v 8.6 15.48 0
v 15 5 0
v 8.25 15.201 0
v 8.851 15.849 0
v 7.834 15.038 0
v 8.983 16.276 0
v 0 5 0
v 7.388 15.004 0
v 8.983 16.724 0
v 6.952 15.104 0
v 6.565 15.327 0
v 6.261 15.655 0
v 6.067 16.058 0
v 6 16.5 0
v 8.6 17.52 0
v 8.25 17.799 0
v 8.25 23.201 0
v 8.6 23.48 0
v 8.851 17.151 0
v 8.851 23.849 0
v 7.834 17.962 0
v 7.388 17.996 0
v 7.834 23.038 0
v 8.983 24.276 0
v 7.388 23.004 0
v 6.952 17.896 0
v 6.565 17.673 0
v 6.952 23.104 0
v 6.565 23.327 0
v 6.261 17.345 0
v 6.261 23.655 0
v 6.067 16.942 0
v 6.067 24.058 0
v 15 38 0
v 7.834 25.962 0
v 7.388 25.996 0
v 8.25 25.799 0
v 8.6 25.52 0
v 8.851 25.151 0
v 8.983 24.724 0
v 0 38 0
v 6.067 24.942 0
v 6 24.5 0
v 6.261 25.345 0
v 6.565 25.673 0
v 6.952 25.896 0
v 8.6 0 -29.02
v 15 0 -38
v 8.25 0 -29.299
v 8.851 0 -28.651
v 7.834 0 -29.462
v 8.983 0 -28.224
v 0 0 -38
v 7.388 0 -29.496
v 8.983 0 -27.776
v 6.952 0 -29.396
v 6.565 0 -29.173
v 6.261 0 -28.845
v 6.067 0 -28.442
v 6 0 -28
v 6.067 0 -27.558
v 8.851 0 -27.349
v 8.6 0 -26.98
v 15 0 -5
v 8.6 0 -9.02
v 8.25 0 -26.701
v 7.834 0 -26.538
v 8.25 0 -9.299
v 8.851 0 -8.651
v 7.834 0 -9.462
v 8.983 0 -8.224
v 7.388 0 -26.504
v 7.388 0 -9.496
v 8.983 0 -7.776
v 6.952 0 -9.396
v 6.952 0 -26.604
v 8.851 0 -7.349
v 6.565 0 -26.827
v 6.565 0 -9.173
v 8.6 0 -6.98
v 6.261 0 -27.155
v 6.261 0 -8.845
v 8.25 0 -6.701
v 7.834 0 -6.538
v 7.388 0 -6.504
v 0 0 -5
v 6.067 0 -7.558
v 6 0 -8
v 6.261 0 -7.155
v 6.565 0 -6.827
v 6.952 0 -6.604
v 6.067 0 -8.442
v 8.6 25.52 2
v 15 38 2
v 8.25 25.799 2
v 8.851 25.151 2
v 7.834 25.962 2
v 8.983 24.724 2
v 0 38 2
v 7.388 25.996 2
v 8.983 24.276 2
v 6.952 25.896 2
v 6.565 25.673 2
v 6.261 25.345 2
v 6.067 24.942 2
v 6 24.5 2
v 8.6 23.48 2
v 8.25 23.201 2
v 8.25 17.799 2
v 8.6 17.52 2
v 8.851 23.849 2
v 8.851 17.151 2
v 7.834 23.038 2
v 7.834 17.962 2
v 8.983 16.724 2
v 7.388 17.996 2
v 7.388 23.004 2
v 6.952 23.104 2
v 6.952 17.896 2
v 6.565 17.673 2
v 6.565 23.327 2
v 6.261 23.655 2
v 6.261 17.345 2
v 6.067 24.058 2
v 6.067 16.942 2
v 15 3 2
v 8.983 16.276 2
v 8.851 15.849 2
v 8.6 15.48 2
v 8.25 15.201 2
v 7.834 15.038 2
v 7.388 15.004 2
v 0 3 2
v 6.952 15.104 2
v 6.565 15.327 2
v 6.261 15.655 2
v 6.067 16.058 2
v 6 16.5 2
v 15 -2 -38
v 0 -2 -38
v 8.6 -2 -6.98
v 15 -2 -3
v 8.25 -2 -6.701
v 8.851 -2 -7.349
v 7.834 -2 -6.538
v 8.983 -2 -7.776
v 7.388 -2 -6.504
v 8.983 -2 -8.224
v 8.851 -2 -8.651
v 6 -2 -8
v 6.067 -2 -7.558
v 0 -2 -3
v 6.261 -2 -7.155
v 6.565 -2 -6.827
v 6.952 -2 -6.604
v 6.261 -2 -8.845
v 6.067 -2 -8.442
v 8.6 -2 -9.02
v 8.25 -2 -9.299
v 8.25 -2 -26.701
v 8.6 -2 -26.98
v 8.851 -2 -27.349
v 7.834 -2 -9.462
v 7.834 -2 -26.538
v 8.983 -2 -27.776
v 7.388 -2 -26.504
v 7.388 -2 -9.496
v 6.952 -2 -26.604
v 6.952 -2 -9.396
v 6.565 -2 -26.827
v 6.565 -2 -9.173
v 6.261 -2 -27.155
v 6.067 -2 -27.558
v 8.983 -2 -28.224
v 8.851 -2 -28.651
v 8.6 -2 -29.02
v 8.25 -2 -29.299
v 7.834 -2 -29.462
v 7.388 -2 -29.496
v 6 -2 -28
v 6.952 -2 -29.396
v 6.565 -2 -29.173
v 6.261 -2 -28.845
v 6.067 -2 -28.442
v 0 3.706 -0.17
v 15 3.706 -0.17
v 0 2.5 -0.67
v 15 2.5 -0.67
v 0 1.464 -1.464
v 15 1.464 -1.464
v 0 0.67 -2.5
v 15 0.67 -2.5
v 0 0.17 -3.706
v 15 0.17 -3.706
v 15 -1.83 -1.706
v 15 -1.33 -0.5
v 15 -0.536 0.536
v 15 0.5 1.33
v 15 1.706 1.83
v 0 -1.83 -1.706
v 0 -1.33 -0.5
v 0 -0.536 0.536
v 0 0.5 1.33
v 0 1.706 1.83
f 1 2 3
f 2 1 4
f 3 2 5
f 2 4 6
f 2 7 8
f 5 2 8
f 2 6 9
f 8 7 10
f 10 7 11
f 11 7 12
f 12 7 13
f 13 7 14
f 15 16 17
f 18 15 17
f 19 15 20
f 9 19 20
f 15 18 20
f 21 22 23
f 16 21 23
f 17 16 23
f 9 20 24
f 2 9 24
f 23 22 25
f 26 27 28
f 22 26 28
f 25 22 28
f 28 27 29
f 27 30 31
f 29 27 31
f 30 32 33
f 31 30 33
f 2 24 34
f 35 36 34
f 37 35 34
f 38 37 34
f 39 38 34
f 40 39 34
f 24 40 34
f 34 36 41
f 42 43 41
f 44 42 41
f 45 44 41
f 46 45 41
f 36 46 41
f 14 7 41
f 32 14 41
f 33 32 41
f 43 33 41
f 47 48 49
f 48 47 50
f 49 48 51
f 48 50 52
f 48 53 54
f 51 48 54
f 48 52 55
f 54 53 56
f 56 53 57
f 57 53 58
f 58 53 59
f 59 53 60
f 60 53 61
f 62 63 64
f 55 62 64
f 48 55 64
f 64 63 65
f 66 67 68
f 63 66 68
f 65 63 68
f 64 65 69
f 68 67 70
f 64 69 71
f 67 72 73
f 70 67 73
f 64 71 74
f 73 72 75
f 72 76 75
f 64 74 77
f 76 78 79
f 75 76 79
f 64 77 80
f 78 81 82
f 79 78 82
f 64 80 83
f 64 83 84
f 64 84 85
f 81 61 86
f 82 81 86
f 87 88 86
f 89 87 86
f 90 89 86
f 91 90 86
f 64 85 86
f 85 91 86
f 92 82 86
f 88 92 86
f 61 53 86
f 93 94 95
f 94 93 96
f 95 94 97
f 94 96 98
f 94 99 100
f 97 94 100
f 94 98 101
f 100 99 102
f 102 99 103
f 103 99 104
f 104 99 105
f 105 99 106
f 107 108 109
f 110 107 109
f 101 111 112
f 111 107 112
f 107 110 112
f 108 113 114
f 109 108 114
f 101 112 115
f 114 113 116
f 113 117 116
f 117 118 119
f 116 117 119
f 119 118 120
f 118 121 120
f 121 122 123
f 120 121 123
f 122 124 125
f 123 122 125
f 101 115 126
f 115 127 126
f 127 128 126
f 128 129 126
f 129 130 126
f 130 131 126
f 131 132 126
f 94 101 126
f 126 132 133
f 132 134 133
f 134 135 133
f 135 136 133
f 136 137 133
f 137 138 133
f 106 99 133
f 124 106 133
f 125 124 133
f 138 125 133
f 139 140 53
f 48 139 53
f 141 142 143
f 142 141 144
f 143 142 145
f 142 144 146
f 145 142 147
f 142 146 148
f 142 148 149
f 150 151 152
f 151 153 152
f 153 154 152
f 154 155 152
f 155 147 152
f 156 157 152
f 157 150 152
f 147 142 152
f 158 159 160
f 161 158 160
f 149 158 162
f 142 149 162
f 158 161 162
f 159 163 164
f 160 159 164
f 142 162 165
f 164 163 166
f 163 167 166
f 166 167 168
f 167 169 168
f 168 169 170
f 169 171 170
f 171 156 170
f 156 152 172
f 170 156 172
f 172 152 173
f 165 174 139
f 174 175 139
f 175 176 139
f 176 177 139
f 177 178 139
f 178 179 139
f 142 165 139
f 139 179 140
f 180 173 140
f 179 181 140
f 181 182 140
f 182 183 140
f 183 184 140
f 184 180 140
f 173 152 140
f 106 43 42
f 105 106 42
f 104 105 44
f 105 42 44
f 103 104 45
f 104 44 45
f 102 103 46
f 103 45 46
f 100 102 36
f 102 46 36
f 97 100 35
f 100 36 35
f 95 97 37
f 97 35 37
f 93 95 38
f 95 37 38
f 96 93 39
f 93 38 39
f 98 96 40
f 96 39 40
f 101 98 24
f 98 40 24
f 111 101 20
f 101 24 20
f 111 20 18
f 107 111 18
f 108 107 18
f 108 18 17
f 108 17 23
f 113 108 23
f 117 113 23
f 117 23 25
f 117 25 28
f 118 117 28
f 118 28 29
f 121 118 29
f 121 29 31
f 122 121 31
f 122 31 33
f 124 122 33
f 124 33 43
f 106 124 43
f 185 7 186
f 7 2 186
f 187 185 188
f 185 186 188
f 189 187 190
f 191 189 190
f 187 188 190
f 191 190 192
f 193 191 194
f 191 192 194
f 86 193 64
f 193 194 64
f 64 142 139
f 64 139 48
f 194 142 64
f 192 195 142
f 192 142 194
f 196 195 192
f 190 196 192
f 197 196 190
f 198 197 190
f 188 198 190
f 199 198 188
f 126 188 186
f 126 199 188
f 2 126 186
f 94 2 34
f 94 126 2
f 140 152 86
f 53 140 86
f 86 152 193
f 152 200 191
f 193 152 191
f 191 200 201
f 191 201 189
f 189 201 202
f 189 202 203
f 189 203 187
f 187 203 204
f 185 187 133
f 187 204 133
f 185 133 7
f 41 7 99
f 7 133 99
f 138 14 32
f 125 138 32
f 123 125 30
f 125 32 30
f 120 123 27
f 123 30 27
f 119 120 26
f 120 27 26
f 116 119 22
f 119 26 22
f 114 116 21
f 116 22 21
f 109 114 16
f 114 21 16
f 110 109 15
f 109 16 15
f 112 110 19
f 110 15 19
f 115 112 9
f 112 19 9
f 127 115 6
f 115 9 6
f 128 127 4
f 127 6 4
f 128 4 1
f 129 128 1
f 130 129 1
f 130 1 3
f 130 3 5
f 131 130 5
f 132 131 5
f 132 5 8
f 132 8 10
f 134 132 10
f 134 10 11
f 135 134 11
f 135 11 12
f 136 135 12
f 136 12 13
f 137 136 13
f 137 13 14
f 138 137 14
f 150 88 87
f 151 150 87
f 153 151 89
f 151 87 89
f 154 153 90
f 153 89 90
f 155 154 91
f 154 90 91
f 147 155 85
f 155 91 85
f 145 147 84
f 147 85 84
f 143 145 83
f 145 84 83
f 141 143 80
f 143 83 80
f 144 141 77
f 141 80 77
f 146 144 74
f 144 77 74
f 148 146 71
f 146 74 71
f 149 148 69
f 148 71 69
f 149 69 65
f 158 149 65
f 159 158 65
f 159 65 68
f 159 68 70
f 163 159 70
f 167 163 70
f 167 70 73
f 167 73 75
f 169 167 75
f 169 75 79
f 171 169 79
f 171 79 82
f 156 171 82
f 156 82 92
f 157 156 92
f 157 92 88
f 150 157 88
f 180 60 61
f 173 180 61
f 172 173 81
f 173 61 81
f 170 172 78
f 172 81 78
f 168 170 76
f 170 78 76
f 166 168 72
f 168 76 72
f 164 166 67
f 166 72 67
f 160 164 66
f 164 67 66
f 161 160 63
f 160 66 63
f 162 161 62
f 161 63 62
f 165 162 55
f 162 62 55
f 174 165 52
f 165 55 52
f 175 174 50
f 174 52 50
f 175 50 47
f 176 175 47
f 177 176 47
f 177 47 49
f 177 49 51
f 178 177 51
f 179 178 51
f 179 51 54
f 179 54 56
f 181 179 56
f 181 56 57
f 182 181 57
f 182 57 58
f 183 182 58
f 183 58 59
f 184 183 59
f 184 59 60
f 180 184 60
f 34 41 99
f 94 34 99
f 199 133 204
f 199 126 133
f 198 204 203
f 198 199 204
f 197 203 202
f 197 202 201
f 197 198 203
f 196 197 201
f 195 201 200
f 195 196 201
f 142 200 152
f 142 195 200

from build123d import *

# Parameters (mm, degrees)
F1_DEPTH = 15
F2_R     = 5
F3_R     = 5
F5_D     = 3
F7_D     = 3


with BuildPart() as f1:
    # F0 (on Right) → F1 (new body)
    with BuildSketch(Plane.YZ):
        Polygon((-2, -38), (0, -38), (0, 0), (38, 0), (38, 2), (-2, 2), align=None)
    extrude(amount=F1_DEPTH)

    # F2
    f2_edges = [f1.edges().sort_by_distance(p)[0] for p in [
        (7.5, -2, 2),
    ]]
    fillet(f2_edges, radius=F2_R)

    # F3
    f3_edges = [f1.edges().sort_by_distance(p)[0] for p in [
        (7.5, 0, 0),
    ]]
    fillet(f3_edges, radius=F3_R)

    # F5 (through all)
    with Locations(Plane.XY.offset(2)):
        with Locations((7.5, 24.5), (7.5, 16.5)):
            Hole(F5_D / 2)

    # F7 (through all)
    with Locations(Plane.XZ.offset(2)):
        with Locations((7.5, -8), (7.5, -28)):
            Hole(F7_D / 2)


solid = f1.part
